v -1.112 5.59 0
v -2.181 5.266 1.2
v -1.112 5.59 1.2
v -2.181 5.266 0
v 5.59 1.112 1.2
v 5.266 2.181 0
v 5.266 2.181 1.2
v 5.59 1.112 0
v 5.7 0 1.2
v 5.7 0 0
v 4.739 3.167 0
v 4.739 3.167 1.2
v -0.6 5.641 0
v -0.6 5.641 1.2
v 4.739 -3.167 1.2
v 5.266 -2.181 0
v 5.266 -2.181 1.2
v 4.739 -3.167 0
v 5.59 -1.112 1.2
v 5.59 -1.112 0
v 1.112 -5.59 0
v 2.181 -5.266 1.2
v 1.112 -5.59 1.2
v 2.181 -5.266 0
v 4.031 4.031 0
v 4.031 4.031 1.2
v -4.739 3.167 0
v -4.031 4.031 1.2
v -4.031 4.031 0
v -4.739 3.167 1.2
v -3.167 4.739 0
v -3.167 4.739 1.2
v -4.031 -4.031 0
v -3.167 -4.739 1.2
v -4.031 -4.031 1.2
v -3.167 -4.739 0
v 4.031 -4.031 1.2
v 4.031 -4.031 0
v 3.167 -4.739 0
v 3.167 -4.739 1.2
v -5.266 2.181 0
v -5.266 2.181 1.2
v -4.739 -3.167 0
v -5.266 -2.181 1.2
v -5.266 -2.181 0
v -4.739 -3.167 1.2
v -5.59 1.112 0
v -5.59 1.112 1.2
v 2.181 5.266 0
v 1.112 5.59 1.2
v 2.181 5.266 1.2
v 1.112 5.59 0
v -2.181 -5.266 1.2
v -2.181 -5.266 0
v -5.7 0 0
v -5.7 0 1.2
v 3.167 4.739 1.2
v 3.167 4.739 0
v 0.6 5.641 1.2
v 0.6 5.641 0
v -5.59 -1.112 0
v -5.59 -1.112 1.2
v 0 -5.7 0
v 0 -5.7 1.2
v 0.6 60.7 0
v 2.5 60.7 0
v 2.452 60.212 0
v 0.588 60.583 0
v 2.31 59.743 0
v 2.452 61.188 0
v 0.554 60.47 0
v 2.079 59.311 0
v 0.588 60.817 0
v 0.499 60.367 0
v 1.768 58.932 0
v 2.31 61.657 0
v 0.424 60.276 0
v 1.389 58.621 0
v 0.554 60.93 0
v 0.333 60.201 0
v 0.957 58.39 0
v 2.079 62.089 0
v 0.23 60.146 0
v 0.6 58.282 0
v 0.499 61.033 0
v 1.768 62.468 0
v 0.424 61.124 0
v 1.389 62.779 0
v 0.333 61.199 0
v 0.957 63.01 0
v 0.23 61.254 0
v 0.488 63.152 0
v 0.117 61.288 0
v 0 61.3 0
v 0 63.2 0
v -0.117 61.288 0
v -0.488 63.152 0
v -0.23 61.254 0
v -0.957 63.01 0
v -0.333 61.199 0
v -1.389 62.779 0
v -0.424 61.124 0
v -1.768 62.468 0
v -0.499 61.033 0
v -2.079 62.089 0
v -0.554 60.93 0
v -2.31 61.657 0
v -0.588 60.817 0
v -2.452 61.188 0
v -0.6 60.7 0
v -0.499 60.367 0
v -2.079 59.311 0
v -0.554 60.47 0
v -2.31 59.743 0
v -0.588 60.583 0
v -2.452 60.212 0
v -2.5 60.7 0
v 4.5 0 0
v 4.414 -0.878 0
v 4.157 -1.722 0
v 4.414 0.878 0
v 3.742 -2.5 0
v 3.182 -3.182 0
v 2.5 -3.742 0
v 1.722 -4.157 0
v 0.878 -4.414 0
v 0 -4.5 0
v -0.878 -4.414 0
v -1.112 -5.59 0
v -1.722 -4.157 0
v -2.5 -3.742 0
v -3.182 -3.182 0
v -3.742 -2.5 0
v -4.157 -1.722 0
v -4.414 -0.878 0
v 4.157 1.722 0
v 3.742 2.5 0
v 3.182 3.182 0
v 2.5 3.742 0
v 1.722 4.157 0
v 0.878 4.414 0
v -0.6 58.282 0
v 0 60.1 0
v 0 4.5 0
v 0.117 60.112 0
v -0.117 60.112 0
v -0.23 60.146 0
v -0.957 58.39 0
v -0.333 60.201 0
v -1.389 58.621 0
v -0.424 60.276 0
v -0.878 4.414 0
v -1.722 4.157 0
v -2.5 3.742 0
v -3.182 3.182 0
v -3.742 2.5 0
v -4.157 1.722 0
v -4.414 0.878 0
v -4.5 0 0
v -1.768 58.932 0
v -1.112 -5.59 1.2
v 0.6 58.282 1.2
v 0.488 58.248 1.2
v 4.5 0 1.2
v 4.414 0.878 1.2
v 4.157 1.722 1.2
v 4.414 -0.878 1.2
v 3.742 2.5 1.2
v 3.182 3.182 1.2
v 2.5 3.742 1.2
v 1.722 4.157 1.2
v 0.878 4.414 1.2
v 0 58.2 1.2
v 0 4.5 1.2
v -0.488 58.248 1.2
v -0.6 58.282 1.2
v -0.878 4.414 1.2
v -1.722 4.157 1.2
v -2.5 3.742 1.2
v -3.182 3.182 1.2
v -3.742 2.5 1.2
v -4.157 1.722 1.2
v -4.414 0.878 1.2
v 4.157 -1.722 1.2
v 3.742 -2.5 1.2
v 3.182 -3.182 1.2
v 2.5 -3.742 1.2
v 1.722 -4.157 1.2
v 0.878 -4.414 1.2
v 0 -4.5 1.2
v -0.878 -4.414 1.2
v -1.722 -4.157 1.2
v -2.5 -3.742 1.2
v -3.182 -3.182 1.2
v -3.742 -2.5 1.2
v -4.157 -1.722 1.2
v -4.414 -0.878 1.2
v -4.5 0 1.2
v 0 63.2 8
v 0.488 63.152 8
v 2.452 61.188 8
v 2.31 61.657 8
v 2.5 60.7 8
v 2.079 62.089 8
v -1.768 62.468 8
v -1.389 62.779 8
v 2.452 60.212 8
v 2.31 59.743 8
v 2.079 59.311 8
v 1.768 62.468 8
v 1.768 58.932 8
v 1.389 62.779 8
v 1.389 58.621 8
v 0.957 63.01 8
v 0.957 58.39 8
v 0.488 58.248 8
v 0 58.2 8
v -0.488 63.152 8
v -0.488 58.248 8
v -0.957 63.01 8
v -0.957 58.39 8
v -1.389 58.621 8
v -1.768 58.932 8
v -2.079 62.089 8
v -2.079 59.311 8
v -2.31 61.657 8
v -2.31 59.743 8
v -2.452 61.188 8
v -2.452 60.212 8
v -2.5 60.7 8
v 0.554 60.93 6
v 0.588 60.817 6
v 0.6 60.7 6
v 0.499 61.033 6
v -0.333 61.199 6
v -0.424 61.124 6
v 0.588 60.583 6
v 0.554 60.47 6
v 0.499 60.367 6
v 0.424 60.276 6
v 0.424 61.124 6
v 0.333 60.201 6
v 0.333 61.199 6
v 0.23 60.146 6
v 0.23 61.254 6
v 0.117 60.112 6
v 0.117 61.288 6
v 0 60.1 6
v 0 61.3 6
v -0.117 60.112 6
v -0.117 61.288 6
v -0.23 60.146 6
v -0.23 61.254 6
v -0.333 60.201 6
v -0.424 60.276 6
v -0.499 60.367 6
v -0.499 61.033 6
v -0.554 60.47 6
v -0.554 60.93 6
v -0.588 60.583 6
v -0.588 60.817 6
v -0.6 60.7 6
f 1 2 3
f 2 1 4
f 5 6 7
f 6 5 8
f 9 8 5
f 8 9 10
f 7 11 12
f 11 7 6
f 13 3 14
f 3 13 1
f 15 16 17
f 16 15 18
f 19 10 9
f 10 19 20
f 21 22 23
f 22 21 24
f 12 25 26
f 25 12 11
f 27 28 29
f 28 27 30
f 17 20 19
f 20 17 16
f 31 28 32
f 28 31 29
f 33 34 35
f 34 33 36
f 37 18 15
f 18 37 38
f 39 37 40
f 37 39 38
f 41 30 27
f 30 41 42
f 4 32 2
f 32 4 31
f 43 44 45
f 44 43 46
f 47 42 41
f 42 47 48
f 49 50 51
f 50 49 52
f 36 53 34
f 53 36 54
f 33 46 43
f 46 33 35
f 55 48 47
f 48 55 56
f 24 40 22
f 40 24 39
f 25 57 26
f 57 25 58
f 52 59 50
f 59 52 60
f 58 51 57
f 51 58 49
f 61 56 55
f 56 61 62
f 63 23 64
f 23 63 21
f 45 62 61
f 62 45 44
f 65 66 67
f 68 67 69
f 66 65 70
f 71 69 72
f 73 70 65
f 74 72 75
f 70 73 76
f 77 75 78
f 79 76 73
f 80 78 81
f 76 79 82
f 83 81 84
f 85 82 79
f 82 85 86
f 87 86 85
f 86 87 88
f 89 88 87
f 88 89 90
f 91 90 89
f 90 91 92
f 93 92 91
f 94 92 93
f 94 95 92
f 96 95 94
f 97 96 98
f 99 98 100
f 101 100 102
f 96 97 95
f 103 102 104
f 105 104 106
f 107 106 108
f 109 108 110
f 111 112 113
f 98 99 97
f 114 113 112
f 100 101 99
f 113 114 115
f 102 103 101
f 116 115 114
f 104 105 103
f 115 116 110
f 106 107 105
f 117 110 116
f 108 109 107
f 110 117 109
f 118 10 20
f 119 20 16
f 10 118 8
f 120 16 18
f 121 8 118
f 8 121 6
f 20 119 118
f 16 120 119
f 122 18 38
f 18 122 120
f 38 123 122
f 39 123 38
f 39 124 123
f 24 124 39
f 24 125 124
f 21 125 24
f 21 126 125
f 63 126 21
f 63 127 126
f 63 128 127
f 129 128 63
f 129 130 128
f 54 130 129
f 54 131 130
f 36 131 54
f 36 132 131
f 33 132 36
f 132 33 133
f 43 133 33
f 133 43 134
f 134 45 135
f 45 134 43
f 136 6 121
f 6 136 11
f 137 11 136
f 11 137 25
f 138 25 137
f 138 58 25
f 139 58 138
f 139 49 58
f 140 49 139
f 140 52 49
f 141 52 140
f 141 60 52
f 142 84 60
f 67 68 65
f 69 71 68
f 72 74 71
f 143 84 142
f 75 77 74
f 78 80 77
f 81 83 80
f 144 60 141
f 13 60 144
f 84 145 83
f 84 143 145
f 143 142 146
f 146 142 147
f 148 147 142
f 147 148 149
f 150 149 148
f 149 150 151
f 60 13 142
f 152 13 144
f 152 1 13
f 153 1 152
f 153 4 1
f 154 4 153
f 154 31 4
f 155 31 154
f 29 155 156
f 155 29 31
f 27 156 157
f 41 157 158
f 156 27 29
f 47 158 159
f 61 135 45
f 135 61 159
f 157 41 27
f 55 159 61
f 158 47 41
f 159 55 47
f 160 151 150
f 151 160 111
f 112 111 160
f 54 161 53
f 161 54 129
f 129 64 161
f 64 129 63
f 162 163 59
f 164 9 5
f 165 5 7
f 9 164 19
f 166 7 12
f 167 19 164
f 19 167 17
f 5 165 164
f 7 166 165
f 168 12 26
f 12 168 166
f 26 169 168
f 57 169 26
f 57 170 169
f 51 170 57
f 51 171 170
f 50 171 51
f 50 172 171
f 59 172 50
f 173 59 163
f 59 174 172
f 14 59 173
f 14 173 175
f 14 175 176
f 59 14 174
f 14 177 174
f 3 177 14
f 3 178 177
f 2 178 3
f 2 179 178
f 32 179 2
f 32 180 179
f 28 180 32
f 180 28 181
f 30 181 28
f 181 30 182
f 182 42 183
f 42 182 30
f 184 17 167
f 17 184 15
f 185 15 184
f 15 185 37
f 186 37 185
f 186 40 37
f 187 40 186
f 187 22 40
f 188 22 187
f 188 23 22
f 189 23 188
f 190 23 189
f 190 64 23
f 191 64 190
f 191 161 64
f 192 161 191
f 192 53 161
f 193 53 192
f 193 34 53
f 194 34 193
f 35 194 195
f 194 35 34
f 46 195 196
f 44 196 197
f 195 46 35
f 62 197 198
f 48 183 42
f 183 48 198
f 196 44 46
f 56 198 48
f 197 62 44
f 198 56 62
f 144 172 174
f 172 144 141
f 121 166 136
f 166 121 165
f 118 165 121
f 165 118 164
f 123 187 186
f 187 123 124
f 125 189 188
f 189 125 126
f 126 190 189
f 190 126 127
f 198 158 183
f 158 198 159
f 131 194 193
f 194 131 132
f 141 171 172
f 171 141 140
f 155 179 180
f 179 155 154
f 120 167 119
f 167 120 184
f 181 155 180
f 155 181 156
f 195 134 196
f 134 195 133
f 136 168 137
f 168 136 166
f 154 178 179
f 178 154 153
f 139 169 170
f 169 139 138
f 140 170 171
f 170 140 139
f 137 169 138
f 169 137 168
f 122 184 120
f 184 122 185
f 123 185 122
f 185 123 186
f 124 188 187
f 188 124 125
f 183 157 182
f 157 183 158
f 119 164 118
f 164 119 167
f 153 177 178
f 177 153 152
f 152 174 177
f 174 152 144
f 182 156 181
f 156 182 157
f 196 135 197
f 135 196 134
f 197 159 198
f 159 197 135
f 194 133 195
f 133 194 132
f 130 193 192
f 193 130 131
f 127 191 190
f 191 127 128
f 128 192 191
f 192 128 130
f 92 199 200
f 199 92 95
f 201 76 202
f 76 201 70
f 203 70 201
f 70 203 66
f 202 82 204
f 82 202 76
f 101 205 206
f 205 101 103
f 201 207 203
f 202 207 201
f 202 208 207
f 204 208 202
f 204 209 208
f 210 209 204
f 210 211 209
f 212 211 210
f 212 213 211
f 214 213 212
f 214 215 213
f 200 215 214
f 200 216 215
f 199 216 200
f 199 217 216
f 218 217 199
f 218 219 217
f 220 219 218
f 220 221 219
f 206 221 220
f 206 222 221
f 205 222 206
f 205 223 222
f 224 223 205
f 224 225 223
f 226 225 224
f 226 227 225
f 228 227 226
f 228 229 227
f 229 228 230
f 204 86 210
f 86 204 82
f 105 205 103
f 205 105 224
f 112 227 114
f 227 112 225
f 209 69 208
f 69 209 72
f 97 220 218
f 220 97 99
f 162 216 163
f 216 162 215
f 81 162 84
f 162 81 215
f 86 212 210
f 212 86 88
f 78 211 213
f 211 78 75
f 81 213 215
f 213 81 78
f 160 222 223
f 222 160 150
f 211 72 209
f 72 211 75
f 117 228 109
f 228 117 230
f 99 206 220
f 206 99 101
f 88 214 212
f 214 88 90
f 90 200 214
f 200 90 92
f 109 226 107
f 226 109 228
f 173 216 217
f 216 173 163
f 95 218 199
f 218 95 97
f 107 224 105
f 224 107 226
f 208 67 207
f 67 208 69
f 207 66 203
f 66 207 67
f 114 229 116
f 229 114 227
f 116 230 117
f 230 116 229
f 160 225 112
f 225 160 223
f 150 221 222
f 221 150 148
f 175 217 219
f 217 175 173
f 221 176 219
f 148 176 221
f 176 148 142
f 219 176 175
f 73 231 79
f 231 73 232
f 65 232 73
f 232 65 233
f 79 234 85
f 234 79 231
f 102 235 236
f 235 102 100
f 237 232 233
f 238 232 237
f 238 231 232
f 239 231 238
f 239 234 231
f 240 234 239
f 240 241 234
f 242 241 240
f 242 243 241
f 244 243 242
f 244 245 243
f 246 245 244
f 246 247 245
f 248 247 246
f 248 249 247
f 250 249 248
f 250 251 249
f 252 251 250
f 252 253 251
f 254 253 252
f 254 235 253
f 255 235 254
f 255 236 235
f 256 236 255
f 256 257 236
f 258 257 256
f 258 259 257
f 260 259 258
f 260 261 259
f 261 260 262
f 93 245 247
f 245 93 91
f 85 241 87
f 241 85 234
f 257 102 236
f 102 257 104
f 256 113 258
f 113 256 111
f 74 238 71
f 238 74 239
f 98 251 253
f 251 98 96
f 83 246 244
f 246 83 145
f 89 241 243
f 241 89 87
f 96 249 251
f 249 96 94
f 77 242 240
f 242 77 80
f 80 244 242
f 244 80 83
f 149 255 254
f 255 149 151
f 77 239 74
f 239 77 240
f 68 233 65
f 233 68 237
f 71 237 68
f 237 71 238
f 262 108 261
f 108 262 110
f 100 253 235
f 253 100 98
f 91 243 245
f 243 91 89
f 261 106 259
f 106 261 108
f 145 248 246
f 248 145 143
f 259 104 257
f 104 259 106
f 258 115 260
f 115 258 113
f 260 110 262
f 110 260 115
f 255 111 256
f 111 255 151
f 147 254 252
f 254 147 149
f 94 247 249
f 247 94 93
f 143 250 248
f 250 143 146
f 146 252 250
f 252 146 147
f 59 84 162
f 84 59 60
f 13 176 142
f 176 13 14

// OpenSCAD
/*
 * OpenSCAD model for tethered multimeter probe caps.
 *
 * Copyright 2020 Tido Klaassen (tido_oscad@4gh.eu).
 * Licensed under terms of Creative Commons Attribution Share Alike 4.0
 * https://creativecommons.org/licenses/by-sa/4.0/
 */

// Inner diameter of leash ring
ring = 9;

// Length of leash
leash = 55;

// Diameter of ring and leash
dia = 1.2;

// Height of tip cap
cap_h = 8;

// Outer diameter of tip cap
cap_d = 5;

// Diameter of tip hole
cap_i = 1.2;
$fn = 32;

// Create ring
difference(){
cylinder(h = dia, d = ring + 2 * dia, center = false);
cylinder(h = dia, d = ring, center = false);
};

// Create tether
translate([-dia / 2, ring / 2, 0])
cube(size = [dia, leash, dia], center = false);

// Create cap
translate([0, ring / 2 + leash + dia, 0])
difference(){
cylinder(h = cap_h, d = cap_d, center = false);
cylinder(h = cap_h * 0.75, d = cap_i, center = false);
}
